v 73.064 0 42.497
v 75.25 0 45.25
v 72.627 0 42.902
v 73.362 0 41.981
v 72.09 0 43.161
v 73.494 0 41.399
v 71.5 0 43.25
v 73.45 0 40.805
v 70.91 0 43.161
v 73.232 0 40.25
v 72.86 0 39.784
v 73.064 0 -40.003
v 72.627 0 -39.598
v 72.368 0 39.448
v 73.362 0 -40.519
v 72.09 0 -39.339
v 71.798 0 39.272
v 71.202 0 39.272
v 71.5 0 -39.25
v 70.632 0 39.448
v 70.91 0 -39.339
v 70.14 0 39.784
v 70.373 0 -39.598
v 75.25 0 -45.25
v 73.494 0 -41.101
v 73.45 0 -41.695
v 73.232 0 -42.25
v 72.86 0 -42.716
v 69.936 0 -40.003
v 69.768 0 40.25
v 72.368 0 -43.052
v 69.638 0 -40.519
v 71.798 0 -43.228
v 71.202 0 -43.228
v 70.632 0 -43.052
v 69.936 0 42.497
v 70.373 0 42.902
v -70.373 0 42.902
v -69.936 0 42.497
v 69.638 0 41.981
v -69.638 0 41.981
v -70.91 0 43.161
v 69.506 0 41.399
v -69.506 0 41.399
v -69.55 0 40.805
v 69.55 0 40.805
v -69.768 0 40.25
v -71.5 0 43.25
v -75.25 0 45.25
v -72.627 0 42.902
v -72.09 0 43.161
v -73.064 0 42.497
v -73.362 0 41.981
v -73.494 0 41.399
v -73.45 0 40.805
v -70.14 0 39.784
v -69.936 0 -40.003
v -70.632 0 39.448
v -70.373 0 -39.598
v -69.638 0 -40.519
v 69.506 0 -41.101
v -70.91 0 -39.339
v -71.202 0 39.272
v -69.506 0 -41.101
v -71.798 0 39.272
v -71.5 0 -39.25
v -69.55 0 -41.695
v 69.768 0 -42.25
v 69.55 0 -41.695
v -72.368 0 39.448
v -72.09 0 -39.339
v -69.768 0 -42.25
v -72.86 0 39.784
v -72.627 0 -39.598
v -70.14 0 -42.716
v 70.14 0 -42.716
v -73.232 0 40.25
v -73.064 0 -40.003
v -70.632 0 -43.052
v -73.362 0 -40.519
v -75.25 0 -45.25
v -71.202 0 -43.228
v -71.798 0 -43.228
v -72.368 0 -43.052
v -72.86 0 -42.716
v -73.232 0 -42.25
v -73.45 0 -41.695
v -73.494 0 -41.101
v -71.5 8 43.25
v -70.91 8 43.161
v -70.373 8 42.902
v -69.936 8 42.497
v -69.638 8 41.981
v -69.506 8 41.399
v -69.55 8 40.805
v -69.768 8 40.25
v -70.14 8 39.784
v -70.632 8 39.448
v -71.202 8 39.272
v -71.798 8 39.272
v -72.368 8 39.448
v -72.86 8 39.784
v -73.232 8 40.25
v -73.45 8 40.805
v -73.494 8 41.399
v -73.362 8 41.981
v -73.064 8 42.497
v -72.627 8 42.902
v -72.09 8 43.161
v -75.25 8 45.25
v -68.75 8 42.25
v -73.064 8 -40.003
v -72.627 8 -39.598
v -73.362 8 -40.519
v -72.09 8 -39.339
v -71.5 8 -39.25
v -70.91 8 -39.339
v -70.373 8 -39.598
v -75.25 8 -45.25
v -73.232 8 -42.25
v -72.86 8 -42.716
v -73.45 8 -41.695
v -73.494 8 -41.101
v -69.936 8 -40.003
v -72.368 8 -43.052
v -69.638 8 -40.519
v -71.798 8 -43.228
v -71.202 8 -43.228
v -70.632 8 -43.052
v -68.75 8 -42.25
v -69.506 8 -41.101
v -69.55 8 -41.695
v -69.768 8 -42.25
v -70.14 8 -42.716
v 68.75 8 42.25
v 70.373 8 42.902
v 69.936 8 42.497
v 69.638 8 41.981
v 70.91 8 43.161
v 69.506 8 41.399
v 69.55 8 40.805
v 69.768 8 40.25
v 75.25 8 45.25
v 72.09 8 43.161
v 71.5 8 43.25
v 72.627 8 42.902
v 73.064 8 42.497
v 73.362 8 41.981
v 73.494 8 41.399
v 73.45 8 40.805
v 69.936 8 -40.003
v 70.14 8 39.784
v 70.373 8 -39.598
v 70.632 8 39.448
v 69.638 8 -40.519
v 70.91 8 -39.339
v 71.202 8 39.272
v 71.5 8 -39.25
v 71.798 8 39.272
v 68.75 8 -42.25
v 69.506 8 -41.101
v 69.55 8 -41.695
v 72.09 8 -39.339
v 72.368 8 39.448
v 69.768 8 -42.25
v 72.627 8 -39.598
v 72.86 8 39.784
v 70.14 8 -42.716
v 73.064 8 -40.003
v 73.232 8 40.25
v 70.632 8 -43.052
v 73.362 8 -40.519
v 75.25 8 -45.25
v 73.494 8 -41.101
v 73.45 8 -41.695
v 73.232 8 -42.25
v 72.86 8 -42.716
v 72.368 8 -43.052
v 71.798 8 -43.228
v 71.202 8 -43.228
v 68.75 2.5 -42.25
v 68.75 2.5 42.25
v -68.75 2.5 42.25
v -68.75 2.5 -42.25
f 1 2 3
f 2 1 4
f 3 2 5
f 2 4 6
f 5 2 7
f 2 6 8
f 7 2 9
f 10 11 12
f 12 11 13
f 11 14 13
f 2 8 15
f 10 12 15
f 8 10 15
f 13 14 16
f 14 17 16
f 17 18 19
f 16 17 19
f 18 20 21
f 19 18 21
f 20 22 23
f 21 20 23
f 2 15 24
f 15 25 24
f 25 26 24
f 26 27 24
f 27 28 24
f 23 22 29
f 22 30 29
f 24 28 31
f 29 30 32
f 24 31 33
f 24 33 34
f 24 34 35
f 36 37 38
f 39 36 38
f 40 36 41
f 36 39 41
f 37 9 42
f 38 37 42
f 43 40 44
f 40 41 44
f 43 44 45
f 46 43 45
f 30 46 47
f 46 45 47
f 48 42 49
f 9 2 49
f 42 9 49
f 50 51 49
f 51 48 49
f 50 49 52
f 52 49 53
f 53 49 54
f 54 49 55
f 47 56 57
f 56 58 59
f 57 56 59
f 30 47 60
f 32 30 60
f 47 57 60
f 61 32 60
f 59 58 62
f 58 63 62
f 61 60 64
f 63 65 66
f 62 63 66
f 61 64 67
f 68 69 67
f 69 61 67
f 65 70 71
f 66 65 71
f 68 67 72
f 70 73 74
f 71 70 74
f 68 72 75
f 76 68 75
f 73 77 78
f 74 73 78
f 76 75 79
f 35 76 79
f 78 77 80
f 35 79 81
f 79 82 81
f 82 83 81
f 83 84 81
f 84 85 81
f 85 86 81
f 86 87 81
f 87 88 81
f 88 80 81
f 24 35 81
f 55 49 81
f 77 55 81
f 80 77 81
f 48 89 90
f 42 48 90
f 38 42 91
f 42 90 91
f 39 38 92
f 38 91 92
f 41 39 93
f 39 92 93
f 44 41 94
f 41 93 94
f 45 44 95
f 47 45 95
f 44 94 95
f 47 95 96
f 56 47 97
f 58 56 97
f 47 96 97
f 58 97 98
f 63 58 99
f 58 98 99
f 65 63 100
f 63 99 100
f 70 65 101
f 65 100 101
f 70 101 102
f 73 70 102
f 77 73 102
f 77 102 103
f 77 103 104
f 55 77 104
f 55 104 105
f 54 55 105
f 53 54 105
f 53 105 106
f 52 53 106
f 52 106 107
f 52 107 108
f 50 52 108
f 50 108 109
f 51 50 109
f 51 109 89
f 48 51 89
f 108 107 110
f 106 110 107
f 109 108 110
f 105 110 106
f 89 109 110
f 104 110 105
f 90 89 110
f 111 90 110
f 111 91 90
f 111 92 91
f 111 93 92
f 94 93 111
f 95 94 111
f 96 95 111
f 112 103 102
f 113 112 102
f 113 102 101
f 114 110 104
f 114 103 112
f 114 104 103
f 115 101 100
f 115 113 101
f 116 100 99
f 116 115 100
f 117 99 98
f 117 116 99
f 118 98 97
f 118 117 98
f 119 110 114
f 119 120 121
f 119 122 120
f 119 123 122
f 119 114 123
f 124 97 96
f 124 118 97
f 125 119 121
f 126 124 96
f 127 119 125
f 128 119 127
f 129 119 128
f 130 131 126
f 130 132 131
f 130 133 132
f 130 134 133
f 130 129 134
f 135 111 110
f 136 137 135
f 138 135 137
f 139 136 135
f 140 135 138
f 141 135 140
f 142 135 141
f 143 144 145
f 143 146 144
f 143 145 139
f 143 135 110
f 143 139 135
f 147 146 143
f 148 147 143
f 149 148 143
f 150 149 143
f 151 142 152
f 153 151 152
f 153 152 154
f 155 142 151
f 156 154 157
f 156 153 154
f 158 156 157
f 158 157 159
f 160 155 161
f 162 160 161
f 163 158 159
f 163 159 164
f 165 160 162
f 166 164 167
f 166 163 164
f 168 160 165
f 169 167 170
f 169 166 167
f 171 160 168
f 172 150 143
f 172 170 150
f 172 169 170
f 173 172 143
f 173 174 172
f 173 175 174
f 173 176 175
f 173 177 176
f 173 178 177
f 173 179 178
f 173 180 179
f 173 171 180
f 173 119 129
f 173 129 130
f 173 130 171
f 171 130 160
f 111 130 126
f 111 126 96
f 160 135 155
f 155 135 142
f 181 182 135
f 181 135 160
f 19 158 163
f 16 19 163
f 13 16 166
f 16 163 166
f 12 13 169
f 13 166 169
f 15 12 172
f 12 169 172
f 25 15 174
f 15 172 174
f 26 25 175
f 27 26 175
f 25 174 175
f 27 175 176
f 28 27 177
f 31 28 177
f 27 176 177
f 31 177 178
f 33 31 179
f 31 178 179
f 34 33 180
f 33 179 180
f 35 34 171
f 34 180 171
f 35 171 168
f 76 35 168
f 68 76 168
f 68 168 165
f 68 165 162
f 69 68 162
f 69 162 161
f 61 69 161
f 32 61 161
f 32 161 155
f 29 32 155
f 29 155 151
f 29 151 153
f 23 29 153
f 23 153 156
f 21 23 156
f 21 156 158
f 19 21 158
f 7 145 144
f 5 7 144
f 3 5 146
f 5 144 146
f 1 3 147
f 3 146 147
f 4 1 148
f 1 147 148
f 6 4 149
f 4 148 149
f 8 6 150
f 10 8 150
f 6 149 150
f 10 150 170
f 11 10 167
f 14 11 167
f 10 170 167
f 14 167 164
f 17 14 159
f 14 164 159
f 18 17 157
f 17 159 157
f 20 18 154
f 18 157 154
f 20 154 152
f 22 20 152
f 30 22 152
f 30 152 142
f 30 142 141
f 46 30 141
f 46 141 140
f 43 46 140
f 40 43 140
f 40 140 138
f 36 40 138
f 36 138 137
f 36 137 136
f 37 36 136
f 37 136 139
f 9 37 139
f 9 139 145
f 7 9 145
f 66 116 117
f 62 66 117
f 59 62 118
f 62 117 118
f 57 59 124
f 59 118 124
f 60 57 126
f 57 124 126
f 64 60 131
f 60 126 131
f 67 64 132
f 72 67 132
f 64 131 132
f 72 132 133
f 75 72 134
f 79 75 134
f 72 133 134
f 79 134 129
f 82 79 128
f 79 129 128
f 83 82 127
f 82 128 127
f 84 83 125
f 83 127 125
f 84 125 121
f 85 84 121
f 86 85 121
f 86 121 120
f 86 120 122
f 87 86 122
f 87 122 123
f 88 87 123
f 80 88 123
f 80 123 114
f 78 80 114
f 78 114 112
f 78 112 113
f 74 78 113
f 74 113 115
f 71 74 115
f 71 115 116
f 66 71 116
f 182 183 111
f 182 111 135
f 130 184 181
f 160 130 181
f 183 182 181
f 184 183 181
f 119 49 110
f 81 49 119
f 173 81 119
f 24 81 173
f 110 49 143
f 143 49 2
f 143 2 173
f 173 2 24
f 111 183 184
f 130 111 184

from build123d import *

# Parameters (mm, degrees)
SKETCH1_W           = 150.5
SKETCH1_H           = 90.5
SKETCH1_W_2         = 137.5
SKETCH1_H_2         = 84.5
BOSS_EXTRUDE1_DEPTH = 8
SKETCH2_R           = 2
CUT_EXTRUDE1_DEPTH  = 39
SKETCH3_W           = 84.5
SKETCH3_H           = 2.5
BOSS_EXTRUDE2_DEPTH = 138


with BuildPart() as part:
    # Sketch1 → Boss-Extrude1 (new body)
    with BuildSketch(Plane(origin=(0, 0, 0), x_dir=(1, 0, 0), z_dir=(0, 1, 0))):
        Rectangle(SKETCH1_W, SKETCH1_H)
        Rectangle(SKETCH1_W_2, SKETCH1_H_2, mode=Mode.SUBTRACT)
    extrude(amount=BOSS_EXTRUDE1_DEPTH)

    # Sketch2 → Cut-Extrude1 (cut)
    with BuildSketch(Plane(origin=(0, 8, 0), x_dir=(1, 0, 0), z_dir=(0, 1, 0))):
        with Locations(Location((-71.5, 41.25, 0), (0, 0, 270))):
            Circle(SKETCH2_R)
        with Locations(Location((-71.5, -41.25, 0), (0, 0, 270))):
            Circle(SKETCH2_R)
        with Locations(Location((71.5, -41.25, 0), (0, 0, 270))):
            Circle(SKETCH2_R)
        with Locations(Location((71.5, 41.25, 0), (0, 0, 270))):
            Circle(SKETCH2_R)
    extrude(amount=-CUT_EXTRUDE1_DEPTH, mode=Mode.SUBTRACT)

    # Sketch3 → Boss-Extrude2 (add)
    with BuildSketch(Plane(origin=(-68.75, 0, 0), x_dir=(0, 0, -1), z_dir=(1, 0, 0))):
        with Locations((0, 1.25)):
            Rectangle(SKETCH3_W, SKETCH3_H)
    extrude(amount=BOSS_EXTRUDE2_DEPTH)


solid = part.part
